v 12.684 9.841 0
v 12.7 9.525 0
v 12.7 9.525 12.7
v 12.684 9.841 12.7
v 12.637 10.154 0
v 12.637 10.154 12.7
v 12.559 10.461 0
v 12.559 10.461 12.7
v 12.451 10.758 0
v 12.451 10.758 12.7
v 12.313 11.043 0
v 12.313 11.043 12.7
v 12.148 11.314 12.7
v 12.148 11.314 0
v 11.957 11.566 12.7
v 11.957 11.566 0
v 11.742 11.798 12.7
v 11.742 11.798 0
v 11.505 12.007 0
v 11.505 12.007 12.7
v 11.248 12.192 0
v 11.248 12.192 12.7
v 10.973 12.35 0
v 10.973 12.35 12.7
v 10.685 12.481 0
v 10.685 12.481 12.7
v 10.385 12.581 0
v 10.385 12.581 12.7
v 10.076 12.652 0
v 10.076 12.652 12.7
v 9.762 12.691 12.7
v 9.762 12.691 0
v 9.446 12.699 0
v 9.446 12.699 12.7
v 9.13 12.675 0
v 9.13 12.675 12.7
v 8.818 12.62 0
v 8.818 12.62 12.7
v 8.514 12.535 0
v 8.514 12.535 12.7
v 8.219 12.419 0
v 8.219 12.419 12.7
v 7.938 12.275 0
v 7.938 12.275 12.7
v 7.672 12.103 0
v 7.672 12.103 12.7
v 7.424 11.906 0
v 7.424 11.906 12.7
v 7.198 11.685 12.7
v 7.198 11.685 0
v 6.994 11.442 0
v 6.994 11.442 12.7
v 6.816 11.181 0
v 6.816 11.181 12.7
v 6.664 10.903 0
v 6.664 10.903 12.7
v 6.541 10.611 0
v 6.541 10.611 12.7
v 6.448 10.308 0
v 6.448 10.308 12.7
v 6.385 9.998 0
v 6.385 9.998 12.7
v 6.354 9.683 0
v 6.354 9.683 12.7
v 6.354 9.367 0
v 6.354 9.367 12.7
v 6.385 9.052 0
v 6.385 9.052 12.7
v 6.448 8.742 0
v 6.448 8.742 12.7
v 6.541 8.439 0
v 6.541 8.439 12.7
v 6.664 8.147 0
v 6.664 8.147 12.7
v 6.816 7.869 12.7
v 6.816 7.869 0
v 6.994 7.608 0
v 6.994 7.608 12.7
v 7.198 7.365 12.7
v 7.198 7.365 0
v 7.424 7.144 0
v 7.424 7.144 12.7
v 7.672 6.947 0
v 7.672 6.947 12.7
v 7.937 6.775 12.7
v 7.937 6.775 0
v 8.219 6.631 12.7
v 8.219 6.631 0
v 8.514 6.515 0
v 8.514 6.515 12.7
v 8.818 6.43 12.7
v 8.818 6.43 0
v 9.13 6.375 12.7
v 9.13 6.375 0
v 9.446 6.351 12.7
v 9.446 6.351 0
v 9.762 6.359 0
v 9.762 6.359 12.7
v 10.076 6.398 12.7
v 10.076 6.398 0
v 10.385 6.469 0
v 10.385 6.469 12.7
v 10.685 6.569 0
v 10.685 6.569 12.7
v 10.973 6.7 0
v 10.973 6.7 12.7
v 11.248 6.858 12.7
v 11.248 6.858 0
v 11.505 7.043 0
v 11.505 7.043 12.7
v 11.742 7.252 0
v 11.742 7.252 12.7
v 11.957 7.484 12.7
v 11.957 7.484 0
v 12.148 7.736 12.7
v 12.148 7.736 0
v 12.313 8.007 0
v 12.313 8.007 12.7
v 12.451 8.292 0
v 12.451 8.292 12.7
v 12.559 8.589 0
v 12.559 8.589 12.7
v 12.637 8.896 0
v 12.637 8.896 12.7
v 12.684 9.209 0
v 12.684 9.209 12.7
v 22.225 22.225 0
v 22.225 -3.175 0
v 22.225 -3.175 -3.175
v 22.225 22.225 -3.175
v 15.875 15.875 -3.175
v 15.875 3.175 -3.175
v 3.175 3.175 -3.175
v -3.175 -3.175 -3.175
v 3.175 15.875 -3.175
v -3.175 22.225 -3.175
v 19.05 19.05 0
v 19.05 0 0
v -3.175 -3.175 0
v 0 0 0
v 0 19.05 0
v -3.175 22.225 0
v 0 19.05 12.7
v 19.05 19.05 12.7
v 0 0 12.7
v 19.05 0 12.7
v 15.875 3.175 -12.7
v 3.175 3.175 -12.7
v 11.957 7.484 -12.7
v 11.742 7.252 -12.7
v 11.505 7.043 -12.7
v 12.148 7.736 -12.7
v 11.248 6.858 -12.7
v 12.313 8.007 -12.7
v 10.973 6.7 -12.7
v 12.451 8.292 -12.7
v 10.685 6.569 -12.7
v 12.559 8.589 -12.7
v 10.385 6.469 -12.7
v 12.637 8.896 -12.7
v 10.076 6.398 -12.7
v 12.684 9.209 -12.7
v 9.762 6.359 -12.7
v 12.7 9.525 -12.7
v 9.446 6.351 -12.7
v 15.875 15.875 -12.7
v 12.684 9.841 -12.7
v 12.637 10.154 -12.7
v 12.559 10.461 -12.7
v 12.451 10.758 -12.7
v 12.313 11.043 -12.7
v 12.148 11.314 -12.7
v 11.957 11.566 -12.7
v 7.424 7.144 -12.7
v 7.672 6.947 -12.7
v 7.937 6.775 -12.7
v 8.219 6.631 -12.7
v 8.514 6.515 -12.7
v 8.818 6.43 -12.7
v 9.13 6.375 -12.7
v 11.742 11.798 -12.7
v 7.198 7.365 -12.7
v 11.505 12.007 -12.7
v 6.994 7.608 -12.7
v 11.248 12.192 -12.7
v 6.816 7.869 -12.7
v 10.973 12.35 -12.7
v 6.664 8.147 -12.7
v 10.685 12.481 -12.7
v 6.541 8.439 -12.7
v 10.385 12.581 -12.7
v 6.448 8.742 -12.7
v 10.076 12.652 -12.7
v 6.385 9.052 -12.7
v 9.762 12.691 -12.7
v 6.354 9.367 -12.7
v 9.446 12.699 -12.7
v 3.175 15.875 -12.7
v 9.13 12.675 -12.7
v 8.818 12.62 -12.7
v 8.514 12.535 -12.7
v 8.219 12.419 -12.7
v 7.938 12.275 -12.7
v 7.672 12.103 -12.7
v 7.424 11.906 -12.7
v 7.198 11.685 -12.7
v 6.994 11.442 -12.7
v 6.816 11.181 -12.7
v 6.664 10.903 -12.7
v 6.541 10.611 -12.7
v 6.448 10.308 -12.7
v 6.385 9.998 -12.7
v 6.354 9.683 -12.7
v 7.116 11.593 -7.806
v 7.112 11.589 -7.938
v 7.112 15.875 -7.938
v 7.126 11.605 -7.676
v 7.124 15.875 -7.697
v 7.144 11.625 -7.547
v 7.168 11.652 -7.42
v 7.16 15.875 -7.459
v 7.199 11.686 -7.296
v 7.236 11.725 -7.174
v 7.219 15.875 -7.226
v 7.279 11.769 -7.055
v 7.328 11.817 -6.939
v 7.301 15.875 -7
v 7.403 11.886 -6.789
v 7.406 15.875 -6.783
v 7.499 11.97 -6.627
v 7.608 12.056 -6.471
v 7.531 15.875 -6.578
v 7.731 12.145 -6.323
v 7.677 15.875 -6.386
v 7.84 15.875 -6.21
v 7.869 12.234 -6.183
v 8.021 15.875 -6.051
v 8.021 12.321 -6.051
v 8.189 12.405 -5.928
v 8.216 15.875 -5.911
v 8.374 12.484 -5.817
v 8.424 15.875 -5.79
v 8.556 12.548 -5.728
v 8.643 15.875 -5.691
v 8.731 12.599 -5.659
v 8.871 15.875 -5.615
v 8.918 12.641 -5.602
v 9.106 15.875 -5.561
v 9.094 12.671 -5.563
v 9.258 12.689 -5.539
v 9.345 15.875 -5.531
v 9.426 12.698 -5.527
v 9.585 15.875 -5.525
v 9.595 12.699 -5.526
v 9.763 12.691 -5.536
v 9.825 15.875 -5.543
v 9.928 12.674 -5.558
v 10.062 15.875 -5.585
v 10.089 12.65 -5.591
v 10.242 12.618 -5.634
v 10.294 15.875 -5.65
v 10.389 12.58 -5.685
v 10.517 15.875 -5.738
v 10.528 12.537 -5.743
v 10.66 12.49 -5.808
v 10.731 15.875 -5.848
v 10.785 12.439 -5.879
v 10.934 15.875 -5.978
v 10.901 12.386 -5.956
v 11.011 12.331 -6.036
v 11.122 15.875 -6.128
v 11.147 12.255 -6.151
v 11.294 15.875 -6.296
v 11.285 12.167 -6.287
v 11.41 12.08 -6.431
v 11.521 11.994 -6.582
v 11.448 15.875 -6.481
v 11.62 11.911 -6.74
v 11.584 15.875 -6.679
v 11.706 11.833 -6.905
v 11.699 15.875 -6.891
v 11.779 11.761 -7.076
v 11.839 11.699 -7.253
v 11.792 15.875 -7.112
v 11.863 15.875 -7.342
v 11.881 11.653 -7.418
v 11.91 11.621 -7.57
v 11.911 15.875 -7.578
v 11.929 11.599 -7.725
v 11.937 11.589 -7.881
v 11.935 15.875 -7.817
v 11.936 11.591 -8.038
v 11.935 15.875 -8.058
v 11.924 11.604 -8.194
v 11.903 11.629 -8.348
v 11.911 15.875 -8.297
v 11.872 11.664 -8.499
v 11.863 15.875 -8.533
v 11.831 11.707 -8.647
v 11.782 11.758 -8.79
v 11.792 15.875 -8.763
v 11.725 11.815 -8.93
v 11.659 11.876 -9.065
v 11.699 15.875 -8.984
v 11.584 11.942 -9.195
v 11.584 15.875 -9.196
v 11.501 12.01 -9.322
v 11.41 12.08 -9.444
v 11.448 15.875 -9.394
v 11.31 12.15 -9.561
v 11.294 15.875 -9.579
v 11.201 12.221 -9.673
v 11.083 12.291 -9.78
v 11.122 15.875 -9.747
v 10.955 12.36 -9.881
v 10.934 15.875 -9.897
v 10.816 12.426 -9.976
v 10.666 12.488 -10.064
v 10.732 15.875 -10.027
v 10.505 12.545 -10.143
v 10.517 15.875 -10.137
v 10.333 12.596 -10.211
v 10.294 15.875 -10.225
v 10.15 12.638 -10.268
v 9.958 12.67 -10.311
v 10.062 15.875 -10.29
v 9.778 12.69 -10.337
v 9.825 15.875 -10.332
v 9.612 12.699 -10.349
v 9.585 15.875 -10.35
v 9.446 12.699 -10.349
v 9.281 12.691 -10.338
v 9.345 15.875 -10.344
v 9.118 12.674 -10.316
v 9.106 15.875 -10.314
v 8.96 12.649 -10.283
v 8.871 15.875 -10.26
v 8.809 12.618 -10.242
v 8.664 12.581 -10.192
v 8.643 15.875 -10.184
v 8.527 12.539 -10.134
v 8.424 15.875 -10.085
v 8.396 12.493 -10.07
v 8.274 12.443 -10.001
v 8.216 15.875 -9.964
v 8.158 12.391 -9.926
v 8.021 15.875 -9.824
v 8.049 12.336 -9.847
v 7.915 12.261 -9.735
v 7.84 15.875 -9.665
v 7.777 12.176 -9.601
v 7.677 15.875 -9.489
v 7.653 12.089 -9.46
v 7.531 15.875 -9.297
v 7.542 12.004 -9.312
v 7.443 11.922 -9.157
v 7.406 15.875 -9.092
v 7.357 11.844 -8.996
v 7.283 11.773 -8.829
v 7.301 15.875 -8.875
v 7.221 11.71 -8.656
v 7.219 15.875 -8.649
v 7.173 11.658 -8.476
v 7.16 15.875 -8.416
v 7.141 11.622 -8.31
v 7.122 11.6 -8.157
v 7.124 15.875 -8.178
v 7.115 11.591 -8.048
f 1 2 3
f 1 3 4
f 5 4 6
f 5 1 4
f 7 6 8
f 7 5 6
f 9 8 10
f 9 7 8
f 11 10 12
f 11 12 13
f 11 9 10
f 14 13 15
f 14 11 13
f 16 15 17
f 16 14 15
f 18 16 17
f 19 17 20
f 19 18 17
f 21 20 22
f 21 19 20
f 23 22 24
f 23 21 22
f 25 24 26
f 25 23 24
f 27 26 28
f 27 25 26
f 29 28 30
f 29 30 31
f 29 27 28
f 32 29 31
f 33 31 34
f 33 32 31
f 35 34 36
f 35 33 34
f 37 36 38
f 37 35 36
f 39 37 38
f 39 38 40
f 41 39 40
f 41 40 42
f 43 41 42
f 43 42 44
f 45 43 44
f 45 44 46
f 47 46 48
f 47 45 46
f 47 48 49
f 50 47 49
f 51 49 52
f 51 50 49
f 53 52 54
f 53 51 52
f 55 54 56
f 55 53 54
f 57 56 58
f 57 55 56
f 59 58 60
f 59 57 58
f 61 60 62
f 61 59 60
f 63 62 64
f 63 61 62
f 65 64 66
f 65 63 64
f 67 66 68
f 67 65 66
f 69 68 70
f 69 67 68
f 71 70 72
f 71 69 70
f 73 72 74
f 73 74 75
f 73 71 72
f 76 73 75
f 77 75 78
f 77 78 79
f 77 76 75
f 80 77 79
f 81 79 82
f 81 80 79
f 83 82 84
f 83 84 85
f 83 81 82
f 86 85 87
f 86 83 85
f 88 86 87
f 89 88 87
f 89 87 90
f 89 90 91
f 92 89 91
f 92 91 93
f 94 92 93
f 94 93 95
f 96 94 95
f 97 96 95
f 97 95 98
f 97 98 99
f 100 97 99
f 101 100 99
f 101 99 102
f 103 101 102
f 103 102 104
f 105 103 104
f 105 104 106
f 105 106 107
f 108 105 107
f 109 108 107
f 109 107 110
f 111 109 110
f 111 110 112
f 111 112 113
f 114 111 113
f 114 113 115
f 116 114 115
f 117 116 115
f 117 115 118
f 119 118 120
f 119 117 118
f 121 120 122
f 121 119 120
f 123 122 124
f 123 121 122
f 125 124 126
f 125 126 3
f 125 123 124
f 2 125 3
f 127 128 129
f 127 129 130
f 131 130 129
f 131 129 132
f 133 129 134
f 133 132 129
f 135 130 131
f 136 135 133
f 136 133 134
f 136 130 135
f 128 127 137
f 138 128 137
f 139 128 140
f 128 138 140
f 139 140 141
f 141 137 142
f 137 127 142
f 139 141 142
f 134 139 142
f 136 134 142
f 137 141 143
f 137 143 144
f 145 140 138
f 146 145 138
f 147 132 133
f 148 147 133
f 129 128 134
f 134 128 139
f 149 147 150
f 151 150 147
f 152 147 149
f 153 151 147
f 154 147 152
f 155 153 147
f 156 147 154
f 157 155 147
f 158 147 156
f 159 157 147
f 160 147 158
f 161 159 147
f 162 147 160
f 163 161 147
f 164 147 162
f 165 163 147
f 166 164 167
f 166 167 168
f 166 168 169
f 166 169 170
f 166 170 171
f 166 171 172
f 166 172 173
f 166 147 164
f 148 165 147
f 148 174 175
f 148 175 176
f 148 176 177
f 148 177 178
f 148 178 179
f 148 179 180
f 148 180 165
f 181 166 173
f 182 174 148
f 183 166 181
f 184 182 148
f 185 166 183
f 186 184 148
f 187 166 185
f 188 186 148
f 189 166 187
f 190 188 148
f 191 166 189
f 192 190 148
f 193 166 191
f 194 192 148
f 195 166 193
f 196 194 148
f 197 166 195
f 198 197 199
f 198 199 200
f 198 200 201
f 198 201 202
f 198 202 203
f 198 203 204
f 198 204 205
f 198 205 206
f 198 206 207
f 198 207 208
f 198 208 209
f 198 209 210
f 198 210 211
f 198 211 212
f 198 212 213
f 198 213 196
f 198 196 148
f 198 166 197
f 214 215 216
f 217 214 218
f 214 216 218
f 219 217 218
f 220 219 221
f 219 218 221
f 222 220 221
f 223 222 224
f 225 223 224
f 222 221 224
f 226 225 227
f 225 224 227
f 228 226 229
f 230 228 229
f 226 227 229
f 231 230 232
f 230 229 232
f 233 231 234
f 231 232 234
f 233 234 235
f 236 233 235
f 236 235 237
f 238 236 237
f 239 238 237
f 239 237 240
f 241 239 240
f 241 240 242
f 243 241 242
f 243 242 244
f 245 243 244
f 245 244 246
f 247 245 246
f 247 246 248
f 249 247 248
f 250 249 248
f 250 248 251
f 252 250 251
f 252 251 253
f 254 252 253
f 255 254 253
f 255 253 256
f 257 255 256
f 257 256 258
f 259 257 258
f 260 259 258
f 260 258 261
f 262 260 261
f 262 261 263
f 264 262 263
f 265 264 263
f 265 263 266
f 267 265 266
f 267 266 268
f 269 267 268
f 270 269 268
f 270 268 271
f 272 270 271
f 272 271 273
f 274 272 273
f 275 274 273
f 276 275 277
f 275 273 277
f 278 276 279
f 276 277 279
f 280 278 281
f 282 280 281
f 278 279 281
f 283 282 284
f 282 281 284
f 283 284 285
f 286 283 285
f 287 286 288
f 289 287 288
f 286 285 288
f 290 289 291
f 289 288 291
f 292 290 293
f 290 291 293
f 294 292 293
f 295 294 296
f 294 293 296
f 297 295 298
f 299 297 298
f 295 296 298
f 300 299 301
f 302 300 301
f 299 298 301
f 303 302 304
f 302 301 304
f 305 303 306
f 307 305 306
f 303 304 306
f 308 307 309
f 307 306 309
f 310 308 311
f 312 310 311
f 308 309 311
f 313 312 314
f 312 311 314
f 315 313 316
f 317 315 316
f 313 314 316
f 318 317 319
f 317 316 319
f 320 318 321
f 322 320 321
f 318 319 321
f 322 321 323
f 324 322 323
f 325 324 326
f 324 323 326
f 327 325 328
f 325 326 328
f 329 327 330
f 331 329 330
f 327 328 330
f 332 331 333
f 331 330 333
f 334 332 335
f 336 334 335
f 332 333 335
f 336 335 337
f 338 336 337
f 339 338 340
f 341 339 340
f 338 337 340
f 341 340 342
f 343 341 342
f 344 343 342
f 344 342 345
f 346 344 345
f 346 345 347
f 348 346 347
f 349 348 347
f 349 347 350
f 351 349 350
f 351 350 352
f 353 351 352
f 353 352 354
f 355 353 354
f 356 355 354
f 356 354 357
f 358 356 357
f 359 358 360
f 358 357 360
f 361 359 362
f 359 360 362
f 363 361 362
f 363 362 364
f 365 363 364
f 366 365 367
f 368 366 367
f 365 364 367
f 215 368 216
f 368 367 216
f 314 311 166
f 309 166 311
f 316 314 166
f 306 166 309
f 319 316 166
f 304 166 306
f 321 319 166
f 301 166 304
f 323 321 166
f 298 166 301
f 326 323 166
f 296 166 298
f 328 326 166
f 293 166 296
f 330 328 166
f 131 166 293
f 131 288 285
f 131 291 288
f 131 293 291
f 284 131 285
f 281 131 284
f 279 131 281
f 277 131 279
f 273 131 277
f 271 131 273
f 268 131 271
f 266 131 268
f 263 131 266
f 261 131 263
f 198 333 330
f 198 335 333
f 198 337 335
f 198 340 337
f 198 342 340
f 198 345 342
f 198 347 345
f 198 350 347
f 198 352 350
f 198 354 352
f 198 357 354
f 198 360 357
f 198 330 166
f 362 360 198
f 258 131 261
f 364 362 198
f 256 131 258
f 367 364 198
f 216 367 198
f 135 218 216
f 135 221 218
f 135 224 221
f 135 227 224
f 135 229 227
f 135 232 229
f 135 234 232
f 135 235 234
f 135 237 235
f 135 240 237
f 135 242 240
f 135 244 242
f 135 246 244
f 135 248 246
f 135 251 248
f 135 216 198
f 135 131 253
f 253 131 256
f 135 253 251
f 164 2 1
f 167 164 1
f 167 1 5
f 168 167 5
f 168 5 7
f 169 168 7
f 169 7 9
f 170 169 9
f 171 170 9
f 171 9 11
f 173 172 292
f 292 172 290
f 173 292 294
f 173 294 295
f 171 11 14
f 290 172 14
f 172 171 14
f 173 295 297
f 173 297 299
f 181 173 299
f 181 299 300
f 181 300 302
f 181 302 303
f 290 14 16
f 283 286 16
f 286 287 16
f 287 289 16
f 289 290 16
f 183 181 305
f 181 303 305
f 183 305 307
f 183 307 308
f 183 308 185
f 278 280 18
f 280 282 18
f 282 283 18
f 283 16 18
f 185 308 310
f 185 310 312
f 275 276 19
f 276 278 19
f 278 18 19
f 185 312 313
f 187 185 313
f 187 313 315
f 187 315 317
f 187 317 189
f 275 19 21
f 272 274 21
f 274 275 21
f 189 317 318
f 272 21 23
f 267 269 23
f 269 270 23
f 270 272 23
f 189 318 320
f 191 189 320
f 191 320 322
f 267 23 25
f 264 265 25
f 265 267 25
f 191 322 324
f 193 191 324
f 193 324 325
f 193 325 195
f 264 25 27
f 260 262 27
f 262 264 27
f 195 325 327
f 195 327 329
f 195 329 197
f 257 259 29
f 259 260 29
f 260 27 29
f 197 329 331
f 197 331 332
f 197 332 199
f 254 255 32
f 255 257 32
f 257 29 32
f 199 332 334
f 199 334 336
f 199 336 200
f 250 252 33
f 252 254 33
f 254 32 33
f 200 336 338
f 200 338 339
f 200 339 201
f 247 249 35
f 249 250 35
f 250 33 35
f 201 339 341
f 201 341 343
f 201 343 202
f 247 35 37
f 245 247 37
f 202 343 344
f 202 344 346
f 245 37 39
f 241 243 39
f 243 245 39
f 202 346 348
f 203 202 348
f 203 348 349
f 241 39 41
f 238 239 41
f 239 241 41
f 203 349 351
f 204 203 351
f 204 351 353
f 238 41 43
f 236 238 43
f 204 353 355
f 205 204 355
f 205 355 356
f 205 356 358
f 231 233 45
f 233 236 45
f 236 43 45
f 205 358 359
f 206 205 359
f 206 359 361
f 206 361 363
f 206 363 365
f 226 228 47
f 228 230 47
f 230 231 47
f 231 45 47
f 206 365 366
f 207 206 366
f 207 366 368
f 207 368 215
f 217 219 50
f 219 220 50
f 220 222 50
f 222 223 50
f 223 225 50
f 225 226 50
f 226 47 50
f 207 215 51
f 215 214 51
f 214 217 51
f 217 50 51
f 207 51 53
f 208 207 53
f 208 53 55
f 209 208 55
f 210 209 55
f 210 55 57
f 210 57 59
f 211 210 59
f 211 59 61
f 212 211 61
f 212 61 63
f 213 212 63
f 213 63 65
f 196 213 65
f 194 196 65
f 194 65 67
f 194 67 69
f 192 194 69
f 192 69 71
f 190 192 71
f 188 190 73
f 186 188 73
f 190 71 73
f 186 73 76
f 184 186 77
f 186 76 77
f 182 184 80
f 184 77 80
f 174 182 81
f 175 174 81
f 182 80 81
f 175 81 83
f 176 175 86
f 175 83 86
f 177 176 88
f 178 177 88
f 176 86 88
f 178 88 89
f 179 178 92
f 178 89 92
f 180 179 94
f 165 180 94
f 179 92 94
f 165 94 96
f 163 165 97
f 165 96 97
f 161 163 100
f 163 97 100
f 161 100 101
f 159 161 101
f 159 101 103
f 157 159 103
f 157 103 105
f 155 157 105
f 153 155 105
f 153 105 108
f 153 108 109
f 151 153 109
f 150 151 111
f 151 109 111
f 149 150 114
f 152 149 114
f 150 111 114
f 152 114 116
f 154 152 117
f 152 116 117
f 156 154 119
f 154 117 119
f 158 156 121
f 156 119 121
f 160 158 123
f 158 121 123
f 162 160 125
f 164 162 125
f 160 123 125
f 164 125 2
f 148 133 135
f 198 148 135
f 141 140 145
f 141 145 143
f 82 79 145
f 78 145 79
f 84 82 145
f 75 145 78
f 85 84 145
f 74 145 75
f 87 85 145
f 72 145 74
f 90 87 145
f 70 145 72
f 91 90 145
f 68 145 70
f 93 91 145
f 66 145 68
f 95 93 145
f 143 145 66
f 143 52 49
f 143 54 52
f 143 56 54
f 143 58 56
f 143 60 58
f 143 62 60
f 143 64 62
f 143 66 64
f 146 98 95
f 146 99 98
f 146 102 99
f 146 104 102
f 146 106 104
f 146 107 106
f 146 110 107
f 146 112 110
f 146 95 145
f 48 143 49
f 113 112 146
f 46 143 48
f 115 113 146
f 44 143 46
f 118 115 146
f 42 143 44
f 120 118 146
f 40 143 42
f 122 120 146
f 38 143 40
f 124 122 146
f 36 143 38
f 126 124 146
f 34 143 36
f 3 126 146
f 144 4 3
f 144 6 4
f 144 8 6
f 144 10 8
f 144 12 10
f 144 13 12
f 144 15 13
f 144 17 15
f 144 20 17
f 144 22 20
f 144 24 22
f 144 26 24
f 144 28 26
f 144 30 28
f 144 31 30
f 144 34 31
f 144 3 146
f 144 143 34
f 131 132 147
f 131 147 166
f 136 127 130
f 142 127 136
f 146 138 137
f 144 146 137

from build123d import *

# Parameters (mm, degrees)
SKETCH2_W           = 19.05
SKETCH2_H           = 19.05
SKETCH2_R           = 3.175
BOSS_EXTRUDE1_DEPTH = 12.7
SKETCH3_W           = 25.4
SKETCH3_H           = 25.4
BOSS_EXTRUDE2_DEPTH = 3.175
SKETCH4_W           = 12.7
SKETCH4_H           = 12.7
BOSS_EXTRUDE3_DEPTH = 9.525
SKETCH5_R           = 3.175
CUT_EXTRUDE1_DEPTH  = 41.411152545
SKETCH6_R           = 2.413
CUT_EXTRUDE2_DEPTH  = 6.35


with BuildPart() as part:
    # Sketch2 → Boss-Extrude1 (new body)
    with BuildSketch(Plane.XY):
        with Locations((9.525, 9.525)):
            Rectangle(SKETCH2_W, SKETCH2_H)
        with Locations((9.525, 9.525)):
            Circle(SKETCH2_R, mode=Mode.SUBTRACT)
    extrude(amount=BOSS_EXTRUDE1_DEPTH)

    # Sketch3 → Boss-Extrude2 (add)
    with BuildSketch(Plane(origin=(0, 0, 0), x_dir=(-1, 0, 0), z_dir=(0, 0, -1))):
        with Locations((-9.525, 9.525)):
            Rectangle(SKETCH3_W, SKETCH3_H)
    extrude(amount=BOSS_EXTRUDE2_DEPTH)

    # Sketch4 → Boss-Extrude3 (add)
    with BuildSketch(Plane(origin=(0, 0, -3.175), x_dir=(-1, 0, 0), z_dir=(0, 0, -1))):
        with Locations((-9.525, 9.525)):
            Rectangle(SKETCH4_W, SKETCH4_H)
    extrude(amount=BOSS_EXTRUDE3_DEPTH)

    # Sketch5 → Cut-Extrude1 (cut, through all)
    with BuildSketch(Plane.XY.offset(12.7)):
        with Locations((9.525, 9.525)):
            Circle(SKETCH5_R)
    extrude(amount=-CUT_EXTRUDE1_DEPTH, mode=Mode.SUBTRACT)

    # Sketch6 → Cut-Extrude2 (cut)
    with BuildSketch(Plane(origin=(0, 15.875, 0), x_dir=(1, 0, 0), z_dir=(0, 1, 0))):
        with Locations(Location((9.525, 7.9375, 0), (0, 0, 180))):
            Circle(SKETCH6_R)
    extrude(amount=-CUT_EXTRUDE2_DEPTH, mode=Mode.SUBTRACT)


solid = part.part
